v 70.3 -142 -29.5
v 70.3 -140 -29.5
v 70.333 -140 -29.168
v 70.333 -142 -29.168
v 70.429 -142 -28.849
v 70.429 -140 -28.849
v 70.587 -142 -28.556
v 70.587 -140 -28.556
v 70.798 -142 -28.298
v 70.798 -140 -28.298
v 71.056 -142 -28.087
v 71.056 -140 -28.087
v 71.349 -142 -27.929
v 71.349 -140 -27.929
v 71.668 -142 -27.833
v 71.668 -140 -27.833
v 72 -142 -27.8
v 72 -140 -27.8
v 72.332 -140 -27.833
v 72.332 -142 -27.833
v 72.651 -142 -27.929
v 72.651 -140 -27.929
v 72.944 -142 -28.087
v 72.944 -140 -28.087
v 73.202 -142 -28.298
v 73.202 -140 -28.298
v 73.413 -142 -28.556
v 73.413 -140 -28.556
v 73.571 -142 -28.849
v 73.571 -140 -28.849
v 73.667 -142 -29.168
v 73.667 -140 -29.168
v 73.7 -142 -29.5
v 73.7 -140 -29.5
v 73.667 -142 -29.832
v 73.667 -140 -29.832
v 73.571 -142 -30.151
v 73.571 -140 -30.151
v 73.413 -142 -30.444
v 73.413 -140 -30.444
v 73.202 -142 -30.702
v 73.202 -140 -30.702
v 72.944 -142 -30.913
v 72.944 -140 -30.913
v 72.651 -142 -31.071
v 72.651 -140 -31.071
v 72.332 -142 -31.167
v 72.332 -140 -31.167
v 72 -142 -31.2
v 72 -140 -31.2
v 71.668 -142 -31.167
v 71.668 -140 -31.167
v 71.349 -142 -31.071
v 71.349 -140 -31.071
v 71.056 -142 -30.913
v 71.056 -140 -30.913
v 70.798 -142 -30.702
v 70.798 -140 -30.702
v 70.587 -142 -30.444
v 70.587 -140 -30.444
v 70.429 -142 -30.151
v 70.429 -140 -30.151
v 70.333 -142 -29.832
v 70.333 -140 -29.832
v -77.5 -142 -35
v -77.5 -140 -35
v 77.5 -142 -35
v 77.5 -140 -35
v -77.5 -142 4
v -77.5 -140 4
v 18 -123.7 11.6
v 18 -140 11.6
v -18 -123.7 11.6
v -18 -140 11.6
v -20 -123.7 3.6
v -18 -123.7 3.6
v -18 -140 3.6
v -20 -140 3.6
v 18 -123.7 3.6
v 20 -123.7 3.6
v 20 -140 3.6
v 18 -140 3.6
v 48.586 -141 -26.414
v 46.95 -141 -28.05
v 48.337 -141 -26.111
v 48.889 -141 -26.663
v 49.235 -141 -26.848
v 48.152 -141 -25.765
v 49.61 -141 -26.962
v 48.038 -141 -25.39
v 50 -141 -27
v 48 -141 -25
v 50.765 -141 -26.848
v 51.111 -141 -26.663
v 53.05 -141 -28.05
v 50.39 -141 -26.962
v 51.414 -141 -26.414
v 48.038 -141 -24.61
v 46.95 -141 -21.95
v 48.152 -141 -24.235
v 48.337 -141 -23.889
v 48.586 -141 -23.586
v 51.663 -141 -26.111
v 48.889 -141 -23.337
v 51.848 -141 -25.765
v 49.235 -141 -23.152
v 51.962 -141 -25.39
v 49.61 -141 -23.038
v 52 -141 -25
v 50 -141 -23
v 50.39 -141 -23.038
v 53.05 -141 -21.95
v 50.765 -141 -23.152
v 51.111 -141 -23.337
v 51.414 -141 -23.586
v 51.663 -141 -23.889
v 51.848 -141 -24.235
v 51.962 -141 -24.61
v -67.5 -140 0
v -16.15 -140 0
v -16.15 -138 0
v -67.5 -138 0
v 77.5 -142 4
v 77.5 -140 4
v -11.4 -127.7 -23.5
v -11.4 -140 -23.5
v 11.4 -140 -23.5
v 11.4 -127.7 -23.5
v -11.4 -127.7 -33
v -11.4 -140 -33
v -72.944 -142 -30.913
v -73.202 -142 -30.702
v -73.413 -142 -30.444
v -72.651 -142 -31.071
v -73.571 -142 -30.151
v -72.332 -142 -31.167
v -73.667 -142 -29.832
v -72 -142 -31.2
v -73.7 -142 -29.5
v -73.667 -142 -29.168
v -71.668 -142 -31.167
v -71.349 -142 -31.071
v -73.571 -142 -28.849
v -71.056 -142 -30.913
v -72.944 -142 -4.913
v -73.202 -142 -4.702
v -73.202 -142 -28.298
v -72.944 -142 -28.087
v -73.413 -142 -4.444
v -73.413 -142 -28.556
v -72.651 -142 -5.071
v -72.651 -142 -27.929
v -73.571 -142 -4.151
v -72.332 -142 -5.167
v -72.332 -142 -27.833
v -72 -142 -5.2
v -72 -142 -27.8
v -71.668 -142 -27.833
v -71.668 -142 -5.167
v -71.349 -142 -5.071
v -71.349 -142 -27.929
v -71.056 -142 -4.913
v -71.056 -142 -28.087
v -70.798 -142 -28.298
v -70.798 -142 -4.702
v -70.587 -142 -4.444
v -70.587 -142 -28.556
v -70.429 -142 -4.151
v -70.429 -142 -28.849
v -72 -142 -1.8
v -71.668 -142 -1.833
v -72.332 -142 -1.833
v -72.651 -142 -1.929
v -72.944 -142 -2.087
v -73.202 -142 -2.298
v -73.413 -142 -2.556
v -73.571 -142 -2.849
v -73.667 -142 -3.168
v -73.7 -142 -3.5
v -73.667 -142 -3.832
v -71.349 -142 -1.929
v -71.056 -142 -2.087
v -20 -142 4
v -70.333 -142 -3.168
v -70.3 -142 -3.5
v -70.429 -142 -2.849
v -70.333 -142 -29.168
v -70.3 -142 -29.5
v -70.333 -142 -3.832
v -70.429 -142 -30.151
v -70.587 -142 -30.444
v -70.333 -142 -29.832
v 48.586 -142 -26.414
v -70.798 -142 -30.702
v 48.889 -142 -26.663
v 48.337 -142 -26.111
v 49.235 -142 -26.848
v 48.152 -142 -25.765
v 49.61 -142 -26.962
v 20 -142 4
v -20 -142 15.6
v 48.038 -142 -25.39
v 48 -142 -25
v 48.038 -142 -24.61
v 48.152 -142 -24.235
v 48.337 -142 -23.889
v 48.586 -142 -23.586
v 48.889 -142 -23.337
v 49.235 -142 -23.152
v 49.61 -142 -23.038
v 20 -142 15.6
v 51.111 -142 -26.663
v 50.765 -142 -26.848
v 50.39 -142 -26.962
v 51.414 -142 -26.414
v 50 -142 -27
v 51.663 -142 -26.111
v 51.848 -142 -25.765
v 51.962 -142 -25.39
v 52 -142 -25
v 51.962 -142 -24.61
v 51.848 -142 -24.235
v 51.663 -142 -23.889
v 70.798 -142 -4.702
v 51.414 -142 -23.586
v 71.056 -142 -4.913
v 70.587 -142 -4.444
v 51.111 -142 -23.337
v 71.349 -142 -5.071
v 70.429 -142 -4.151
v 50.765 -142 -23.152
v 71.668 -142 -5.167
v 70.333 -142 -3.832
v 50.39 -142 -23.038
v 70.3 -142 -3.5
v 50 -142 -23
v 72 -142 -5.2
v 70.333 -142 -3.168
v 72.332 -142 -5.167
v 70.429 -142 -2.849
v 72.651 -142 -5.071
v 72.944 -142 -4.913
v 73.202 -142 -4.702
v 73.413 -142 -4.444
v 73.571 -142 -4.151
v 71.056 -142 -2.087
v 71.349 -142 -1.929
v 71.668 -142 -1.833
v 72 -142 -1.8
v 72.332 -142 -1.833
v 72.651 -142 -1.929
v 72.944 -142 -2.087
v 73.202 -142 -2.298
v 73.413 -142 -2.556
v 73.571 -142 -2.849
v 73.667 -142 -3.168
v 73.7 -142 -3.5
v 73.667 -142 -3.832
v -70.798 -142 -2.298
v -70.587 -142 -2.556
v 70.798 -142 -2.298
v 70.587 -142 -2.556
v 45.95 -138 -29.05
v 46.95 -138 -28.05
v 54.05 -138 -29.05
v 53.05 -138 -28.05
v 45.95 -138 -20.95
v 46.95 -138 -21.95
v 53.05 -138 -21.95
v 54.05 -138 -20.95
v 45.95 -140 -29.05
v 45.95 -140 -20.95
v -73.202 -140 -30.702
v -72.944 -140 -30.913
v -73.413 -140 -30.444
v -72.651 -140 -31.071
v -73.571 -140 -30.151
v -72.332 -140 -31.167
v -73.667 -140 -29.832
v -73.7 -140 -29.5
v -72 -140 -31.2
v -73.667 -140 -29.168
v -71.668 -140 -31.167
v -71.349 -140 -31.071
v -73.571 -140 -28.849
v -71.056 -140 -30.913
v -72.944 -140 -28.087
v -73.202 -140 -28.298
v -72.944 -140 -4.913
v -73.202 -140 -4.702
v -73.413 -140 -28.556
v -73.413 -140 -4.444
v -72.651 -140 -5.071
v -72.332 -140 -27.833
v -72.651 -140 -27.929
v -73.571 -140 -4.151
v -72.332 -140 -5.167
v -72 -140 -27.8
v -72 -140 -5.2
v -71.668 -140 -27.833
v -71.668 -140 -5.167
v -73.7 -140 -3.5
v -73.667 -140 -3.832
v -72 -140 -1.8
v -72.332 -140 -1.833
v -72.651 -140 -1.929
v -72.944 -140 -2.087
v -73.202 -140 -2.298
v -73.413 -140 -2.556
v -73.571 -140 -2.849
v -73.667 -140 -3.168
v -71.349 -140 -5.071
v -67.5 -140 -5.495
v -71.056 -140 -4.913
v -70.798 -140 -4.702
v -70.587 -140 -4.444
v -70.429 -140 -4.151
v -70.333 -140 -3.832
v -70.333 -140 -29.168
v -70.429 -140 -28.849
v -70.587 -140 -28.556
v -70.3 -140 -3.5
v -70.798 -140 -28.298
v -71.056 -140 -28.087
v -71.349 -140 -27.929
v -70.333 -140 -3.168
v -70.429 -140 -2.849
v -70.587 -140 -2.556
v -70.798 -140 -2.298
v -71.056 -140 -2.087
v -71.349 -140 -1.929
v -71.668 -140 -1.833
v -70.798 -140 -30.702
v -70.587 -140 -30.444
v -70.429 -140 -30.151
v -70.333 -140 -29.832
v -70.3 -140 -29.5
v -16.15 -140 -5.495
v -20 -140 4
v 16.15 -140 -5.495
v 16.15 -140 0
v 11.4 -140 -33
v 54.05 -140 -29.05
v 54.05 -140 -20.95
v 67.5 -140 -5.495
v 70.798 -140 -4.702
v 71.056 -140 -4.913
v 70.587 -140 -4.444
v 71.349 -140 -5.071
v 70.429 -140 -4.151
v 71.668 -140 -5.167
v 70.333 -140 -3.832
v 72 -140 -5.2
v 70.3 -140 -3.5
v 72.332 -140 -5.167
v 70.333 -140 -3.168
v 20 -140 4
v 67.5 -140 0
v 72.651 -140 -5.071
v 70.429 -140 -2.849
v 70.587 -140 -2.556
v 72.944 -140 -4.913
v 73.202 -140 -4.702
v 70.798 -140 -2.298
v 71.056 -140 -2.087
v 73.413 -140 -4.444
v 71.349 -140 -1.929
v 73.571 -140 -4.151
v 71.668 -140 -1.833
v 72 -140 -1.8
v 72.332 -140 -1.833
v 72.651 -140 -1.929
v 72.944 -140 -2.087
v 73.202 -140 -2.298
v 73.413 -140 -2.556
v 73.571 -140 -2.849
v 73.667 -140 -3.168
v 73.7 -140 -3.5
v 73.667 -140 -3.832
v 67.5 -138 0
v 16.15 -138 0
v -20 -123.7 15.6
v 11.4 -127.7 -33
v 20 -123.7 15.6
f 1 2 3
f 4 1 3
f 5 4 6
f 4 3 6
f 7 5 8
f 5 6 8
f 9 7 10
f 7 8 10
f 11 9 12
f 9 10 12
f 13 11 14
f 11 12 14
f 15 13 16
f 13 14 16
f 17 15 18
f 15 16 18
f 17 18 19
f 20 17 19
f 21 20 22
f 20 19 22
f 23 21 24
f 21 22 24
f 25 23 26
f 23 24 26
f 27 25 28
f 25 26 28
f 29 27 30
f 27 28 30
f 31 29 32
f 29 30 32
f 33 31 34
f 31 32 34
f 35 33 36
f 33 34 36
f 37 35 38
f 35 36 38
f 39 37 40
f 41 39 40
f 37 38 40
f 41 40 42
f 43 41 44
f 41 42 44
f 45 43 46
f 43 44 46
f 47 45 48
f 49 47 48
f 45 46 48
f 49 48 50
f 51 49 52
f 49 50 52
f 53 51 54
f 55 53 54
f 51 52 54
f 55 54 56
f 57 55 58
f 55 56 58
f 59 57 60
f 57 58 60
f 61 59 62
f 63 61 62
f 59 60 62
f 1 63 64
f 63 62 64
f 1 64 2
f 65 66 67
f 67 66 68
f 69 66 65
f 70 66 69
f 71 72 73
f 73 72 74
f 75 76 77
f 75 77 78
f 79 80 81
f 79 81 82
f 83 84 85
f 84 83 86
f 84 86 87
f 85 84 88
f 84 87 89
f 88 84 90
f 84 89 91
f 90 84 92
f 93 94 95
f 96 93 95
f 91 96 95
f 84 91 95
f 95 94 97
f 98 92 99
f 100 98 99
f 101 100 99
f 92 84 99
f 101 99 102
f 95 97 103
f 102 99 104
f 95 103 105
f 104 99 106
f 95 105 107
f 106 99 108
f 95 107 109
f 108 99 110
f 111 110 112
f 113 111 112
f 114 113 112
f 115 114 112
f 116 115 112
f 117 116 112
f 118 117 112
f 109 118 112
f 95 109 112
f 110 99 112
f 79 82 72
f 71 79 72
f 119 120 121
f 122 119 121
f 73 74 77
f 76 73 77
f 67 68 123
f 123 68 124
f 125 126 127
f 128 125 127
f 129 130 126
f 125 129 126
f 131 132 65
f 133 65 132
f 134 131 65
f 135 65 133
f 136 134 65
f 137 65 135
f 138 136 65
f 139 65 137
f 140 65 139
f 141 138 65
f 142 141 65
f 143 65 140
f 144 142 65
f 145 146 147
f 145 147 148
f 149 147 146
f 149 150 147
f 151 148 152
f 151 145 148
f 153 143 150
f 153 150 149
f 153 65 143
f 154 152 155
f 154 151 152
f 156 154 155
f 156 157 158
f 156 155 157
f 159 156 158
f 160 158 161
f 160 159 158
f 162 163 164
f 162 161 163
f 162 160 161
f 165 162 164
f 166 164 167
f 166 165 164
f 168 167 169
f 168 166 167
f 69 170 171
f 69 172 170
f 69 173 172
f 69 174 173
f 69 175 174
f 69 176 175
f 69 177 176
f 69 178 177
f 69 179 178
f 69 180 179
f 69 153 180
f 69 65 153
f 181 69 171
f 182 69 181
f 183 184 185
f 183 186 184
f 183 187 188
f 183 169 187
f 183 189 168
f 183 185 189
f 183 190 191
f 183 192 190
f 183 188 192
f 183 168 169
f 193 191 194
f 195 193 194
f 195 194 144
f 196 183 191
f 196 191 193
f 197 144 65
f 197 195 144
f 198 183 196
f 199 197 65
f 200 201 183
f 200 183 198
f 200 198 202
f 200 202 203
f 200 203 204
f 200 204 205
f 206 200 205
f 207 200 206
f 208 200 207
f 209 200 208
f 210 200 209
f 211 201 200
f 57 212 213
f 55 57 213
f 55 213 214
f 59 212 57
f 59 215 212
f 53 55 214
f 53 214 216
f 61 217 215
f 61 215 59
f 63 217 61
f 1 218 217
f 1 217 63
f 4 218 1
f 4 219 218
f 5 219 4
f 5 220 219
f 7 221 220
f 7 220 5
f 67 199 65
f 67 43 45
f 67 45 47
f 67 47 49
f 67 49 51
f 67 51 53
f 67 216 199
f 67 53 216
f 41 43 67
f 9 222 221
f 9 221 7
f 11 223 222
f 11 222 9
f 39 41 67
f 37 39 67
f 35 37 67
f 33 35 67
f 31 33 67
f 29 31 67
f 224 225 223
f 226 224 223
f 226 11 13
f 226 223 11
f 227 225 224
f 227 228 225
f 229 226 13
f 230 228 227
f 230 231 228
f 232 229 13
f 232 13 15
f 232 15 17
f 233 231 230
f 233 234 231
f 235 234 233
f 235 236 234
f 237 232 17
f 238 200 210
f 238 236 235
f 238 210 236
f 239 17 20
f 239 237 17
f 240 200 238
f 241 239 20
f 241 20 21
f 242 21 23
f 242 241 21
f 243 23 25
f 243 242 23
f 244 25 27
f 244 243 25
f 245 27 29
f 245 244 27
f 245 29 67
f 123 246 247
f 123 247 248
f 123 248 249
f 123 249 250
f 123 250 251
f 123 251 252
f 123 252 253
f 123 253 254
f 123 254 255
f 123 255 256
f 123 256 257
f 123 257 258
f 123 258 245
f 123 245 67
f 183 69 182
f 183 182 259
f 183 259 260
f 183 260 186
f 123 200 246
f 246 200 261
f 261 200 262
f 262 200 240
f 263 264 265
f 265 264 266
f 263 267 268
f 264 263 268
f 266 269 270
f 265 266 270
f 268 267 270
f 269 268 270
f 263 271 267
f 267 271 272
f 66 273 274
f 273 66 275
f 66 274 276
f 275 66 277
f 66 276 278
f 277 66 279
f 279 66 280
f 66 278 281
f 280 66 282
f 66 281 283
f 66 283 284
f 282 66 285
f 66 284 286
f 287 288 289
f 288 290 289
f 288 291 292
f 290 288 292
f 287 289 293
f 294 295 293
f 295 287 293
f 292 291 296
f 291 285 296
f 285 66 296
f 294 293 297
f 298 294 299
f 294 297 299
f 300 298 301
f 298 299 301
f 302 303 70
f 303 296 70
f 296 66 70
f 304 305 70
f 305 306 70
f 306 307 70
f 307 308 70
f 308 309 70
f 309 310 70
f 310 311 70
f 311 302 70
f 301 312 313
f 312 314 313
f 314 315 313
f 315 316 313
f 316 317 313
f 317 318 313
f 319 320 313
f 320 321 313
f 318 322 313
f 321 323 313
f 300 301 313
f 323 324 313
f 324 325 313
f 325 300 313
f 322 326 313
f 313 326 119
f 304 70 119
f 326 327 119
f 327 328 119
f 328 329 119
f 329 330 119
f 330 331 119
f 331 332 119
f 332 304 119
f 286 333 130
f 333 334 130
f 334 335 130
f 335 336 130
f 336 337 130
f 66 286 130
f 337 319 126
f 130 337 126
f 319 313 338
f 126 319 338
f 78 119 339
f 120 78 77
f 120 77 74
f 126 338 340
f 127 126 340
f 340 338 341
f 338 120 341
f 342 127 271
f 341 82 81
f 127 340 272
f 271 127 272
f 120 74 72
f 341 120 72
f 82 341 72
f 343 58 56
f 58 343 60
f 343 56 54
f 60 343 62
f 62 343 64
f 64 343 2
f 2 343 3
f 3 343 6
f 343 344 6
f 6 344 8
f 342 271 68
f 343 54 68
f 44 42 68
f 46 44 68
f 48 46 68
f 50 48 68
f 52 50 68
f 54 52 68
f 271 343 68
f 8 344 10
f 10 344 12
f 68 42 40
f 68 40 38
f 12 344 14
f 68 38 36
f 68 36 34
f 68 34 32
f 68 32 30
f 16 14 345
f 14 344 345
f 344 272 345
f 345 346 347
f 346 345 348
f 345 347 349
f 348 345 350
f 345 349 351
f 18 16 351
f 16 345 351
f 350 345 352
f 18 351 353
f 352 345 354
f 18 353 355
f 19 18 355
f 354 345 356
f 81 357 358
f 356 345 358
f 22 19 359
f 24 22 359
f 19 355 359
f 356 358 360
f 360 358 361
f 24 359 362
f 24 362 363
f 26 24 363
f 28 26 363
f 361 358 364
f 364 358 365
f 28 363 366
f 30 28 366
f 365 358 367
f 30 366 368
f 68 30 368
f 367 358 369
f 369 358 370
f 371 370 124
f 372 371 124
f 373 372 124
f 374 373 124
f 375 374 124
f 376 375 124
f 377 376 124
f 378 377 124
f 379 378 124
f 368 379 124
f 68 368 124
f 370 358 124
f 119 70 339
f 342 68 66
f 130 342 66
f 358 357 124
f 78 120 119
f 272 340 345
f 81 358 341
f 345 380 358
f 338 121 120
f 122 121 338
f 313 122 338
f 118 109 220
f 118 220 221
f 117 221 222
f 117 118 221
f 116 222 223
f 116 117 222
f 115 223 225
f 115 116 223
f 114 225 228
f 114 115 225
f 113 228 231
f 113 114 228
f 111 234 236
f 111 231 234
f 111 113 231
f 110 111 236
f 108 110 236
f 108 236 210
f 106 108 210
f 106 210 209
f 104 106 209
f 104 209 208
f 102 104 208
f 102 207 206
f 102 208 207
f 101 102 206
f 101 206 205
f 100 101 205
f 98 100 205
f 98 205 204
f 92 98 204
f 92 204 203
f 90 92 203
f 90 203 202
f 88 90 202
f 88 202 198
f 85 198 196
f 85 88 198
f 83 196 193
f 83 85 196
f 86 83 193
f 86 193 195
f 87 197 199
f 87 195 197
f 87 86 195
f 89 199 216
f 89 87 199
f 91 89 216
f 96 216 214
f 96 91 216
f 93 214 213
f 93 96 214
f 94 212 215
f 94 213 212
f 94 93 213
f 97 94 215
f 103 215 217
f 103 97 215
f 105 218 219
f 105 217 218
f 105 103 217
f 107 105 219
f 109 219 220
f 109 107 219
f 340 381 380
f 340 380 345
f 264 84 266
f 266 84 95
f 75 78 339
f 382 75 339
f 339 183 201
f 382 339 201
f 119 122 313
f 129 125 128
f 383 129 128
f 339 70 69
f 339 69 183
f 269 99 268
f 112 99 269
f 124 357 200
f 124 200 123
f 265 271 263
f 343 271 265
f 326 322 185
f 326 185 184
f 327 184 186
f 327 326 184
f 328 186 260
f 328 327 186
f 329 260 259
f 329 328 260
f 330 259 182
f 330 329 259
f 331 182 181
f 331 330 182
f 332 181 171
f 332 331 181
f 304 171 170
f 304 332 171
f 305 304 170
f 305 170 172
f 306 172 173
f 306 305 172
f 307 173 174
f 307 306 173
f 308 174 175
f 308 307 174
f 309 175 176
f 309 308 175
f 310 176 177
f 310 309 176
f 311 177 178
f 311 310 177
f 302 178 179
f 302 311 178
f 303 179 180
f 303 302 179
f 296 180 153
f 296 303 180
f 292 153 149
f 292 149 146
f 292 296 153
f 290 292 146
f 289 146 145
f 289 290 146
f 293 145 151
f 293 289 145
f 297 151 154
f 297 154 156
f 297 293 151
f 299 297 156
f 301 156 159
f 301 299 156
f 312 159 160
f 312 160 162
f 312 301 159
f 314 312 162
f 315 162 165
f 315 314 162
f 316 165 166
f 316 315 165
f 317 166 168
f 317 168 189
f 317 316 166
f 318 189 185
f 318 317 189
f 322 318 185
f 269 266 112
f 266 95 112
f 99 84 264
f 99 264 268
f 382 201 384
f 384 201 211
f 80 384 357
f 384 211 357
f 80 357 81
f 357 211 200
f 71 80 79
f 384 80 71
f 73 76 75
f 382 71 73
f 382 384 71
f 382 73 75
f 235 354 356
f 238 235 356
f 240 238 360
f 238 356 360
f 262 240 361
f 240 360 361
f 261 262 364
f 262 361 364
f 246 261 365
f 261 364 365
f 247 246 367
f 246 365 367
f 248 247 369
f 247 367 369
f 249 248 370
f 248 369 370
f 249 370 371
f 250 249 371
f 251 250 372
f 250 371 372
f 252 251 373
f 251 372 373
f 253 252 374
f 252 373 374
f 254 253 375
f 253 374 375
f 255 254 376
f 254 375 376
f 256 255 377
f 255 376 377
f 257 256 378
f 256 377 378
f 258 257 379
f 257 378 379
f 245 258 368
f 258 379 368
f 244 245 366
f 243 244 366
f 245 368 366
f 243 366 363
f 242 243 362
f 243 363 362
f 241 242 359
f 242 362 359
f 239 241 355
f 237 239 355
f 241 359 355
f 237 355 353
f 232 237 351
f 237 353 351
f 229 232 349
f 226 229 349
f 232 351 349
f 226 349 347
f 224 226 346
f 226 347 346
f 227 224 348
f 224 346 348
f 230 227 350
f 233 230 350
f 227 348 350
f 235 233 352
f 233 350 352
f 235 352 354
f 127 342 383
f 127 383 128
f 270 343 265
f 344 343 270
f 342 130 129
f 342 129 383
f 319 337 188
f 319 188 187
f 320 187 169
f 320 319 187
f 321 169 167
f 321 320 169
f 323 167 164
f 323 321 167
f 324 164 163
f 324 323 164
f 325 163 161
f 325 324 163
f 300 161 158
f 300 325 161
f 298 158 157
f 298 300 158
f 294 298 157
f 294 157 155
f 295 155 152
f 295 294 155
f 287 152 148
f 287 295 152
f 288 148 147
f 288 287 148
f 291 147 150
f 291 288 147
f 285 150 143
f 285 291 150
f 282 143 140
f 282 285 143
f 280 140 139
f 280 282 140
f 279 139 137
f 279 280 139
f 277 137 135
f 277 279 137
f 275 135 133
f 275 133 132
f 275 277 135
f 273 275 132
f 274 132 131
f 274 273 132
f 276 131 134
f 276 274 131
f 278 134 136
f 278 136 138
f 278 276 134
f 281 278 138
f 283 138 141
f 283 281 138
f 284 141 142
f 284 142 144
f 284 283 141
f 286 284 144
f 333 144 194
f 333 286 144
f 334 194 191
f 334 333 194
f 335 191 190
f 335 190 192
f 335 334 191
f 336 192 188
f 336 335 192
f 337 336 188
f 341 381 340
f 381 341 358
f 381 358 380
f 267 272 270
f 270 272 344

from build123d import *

# Parameters (mm, degrees)
SKETCH043_W     = 155
SKETCH043_H     = 39
PAD008_DEPTH    = 2
SKETCH044_W     = 22.8
SKETCH044_H     = 9.5
PAD009_DEPTH    = 12.3
PAD011_DEPTH    = 51.35
SKETCH052_W     = 6.1
SKETCH052_H     = 6.1
POCKET011_DEPTH = 1
SKETCH053_R     = 2
POCKET012_DEPTH = 2.001
SKETCH065_W     = 40
SKETCH065_H     = 12
PAD020_DEPTH    = 2
PAD021_DEPTH    = 16.3
SKETCH069_R     = 1.7
POCKET016_DEPTH = 2
SKETCH079_W     = 8.1
SKETCH079_H     = 8.1
SKETCH079_W_2   = 6.1
SKETCH079_H_2   = 6.1
PAD025_DEPTH    = 2


with BuildPart() as part:
    # Sketch043 → Pad008 (new body)
    with BuildSketch(Plane.XZ):
        with Locations((0, -15.5)):
            Rectangle(SKETCH043_W, SKETCH043_H)
    extrude(amount=PAD008_DEPTH)

    # Sketch044 → Pad009 (join)
    with BuildSketch(Plane.XZ):
        with Locations((0, -28.25)):
            Rectangle(SKETCH044_W, SKETCH044_H)
    extrude(amount=-PAD009_DEPTH)

    # Sketch046 (on DatumPlane) → Pad011 (join)
    with BuildSketch(Plane.YZ.offset(-16.15)):
        Polygon((0, 0), (2, 0), (0, -5.494955), align=None)
    pad011 = extrude(amount=-PAD011_DEPTH)

    # Mirrored005: Pad011 across YZ
    add(pad011.mirror(Plane.YZ))

    # Sketch052 → Pocket011 (cut)
    with BuildSketch(Plane.XZ):
        with Locations((50, -25)):
            Rectangle(SKETCH052_W, SKETCH052_H)
    extrude(amount=POCKET011_DEPTH, mode=Mode.SUBTRACT)

    # Sketch053 → Pocket012 (cut, through all)
    with BuildSketch(Plane.XZ):
        with Locations((50, -25)):
            Circle(SKETCH053_R)
    extrude(amount=POCKET012_DEPTH, mode=Mode.SUBTRACT)

    # Sketch065 → Pad020 (join)
    with BuildSketch(Plane.XZ):
        with Locations((0, 9.6)):
            Rectangle(SKETCH065_W, SKETCH065_H)
    extrude(amount=PAD020_DEPTH)

    # Sketch066 → Pad021 (join)
    with BuildSketch(Plane.XZ):
        Polygon((-20, 3.6), (-20, 15.6), (20, 15.6), (20, 3.6), (18, 3.6), (18, 11.6), (-18, 11.6), (-18, 3.6), align=None)
    extrude(amount=-PAD021_DEPTH)

    # Sketch069 → Pocket016 (cut)
    with BuildSketch(Plane.XZ):
        with Locations((-72, -3.5)):
            Circle(SKETCH069_R)
        with Locations((-72, -29.5)):
            Circle(SKETCH069_R)
    pocket016 = extrude(amount=POCKET016_DEPTH, mode=Mode.SUBTRACT)

    # Mirrored010: Pocket016 across Sketch069 V_Axis
    add(pocket016.mirror(Plane(origin=(0, 0, 0), x_dir=(0, -1, 0), z_dir=(1, 0, 0))), mode=Mode.SUBTRACT)

    # Sketch079 → Pad025 (join)
    with BuildSketch(Plane.XZ):
        with Locations((50, -25)):
            Rectangle(SKETCH079_W, SKETCH079_H)
        with Locations((50, -25)):
            Rectangle(SKETCH079_W_2, SKETCH079_H_2, mode=Mode.SUBTRACT)
    extrude(amount=-PAD025_DEPTH)


with BuildPart() as part_1:
    # Body005 placement: moved
    add(part.part.moved(Location((0, -140, 0))))


solid = part_1.part
